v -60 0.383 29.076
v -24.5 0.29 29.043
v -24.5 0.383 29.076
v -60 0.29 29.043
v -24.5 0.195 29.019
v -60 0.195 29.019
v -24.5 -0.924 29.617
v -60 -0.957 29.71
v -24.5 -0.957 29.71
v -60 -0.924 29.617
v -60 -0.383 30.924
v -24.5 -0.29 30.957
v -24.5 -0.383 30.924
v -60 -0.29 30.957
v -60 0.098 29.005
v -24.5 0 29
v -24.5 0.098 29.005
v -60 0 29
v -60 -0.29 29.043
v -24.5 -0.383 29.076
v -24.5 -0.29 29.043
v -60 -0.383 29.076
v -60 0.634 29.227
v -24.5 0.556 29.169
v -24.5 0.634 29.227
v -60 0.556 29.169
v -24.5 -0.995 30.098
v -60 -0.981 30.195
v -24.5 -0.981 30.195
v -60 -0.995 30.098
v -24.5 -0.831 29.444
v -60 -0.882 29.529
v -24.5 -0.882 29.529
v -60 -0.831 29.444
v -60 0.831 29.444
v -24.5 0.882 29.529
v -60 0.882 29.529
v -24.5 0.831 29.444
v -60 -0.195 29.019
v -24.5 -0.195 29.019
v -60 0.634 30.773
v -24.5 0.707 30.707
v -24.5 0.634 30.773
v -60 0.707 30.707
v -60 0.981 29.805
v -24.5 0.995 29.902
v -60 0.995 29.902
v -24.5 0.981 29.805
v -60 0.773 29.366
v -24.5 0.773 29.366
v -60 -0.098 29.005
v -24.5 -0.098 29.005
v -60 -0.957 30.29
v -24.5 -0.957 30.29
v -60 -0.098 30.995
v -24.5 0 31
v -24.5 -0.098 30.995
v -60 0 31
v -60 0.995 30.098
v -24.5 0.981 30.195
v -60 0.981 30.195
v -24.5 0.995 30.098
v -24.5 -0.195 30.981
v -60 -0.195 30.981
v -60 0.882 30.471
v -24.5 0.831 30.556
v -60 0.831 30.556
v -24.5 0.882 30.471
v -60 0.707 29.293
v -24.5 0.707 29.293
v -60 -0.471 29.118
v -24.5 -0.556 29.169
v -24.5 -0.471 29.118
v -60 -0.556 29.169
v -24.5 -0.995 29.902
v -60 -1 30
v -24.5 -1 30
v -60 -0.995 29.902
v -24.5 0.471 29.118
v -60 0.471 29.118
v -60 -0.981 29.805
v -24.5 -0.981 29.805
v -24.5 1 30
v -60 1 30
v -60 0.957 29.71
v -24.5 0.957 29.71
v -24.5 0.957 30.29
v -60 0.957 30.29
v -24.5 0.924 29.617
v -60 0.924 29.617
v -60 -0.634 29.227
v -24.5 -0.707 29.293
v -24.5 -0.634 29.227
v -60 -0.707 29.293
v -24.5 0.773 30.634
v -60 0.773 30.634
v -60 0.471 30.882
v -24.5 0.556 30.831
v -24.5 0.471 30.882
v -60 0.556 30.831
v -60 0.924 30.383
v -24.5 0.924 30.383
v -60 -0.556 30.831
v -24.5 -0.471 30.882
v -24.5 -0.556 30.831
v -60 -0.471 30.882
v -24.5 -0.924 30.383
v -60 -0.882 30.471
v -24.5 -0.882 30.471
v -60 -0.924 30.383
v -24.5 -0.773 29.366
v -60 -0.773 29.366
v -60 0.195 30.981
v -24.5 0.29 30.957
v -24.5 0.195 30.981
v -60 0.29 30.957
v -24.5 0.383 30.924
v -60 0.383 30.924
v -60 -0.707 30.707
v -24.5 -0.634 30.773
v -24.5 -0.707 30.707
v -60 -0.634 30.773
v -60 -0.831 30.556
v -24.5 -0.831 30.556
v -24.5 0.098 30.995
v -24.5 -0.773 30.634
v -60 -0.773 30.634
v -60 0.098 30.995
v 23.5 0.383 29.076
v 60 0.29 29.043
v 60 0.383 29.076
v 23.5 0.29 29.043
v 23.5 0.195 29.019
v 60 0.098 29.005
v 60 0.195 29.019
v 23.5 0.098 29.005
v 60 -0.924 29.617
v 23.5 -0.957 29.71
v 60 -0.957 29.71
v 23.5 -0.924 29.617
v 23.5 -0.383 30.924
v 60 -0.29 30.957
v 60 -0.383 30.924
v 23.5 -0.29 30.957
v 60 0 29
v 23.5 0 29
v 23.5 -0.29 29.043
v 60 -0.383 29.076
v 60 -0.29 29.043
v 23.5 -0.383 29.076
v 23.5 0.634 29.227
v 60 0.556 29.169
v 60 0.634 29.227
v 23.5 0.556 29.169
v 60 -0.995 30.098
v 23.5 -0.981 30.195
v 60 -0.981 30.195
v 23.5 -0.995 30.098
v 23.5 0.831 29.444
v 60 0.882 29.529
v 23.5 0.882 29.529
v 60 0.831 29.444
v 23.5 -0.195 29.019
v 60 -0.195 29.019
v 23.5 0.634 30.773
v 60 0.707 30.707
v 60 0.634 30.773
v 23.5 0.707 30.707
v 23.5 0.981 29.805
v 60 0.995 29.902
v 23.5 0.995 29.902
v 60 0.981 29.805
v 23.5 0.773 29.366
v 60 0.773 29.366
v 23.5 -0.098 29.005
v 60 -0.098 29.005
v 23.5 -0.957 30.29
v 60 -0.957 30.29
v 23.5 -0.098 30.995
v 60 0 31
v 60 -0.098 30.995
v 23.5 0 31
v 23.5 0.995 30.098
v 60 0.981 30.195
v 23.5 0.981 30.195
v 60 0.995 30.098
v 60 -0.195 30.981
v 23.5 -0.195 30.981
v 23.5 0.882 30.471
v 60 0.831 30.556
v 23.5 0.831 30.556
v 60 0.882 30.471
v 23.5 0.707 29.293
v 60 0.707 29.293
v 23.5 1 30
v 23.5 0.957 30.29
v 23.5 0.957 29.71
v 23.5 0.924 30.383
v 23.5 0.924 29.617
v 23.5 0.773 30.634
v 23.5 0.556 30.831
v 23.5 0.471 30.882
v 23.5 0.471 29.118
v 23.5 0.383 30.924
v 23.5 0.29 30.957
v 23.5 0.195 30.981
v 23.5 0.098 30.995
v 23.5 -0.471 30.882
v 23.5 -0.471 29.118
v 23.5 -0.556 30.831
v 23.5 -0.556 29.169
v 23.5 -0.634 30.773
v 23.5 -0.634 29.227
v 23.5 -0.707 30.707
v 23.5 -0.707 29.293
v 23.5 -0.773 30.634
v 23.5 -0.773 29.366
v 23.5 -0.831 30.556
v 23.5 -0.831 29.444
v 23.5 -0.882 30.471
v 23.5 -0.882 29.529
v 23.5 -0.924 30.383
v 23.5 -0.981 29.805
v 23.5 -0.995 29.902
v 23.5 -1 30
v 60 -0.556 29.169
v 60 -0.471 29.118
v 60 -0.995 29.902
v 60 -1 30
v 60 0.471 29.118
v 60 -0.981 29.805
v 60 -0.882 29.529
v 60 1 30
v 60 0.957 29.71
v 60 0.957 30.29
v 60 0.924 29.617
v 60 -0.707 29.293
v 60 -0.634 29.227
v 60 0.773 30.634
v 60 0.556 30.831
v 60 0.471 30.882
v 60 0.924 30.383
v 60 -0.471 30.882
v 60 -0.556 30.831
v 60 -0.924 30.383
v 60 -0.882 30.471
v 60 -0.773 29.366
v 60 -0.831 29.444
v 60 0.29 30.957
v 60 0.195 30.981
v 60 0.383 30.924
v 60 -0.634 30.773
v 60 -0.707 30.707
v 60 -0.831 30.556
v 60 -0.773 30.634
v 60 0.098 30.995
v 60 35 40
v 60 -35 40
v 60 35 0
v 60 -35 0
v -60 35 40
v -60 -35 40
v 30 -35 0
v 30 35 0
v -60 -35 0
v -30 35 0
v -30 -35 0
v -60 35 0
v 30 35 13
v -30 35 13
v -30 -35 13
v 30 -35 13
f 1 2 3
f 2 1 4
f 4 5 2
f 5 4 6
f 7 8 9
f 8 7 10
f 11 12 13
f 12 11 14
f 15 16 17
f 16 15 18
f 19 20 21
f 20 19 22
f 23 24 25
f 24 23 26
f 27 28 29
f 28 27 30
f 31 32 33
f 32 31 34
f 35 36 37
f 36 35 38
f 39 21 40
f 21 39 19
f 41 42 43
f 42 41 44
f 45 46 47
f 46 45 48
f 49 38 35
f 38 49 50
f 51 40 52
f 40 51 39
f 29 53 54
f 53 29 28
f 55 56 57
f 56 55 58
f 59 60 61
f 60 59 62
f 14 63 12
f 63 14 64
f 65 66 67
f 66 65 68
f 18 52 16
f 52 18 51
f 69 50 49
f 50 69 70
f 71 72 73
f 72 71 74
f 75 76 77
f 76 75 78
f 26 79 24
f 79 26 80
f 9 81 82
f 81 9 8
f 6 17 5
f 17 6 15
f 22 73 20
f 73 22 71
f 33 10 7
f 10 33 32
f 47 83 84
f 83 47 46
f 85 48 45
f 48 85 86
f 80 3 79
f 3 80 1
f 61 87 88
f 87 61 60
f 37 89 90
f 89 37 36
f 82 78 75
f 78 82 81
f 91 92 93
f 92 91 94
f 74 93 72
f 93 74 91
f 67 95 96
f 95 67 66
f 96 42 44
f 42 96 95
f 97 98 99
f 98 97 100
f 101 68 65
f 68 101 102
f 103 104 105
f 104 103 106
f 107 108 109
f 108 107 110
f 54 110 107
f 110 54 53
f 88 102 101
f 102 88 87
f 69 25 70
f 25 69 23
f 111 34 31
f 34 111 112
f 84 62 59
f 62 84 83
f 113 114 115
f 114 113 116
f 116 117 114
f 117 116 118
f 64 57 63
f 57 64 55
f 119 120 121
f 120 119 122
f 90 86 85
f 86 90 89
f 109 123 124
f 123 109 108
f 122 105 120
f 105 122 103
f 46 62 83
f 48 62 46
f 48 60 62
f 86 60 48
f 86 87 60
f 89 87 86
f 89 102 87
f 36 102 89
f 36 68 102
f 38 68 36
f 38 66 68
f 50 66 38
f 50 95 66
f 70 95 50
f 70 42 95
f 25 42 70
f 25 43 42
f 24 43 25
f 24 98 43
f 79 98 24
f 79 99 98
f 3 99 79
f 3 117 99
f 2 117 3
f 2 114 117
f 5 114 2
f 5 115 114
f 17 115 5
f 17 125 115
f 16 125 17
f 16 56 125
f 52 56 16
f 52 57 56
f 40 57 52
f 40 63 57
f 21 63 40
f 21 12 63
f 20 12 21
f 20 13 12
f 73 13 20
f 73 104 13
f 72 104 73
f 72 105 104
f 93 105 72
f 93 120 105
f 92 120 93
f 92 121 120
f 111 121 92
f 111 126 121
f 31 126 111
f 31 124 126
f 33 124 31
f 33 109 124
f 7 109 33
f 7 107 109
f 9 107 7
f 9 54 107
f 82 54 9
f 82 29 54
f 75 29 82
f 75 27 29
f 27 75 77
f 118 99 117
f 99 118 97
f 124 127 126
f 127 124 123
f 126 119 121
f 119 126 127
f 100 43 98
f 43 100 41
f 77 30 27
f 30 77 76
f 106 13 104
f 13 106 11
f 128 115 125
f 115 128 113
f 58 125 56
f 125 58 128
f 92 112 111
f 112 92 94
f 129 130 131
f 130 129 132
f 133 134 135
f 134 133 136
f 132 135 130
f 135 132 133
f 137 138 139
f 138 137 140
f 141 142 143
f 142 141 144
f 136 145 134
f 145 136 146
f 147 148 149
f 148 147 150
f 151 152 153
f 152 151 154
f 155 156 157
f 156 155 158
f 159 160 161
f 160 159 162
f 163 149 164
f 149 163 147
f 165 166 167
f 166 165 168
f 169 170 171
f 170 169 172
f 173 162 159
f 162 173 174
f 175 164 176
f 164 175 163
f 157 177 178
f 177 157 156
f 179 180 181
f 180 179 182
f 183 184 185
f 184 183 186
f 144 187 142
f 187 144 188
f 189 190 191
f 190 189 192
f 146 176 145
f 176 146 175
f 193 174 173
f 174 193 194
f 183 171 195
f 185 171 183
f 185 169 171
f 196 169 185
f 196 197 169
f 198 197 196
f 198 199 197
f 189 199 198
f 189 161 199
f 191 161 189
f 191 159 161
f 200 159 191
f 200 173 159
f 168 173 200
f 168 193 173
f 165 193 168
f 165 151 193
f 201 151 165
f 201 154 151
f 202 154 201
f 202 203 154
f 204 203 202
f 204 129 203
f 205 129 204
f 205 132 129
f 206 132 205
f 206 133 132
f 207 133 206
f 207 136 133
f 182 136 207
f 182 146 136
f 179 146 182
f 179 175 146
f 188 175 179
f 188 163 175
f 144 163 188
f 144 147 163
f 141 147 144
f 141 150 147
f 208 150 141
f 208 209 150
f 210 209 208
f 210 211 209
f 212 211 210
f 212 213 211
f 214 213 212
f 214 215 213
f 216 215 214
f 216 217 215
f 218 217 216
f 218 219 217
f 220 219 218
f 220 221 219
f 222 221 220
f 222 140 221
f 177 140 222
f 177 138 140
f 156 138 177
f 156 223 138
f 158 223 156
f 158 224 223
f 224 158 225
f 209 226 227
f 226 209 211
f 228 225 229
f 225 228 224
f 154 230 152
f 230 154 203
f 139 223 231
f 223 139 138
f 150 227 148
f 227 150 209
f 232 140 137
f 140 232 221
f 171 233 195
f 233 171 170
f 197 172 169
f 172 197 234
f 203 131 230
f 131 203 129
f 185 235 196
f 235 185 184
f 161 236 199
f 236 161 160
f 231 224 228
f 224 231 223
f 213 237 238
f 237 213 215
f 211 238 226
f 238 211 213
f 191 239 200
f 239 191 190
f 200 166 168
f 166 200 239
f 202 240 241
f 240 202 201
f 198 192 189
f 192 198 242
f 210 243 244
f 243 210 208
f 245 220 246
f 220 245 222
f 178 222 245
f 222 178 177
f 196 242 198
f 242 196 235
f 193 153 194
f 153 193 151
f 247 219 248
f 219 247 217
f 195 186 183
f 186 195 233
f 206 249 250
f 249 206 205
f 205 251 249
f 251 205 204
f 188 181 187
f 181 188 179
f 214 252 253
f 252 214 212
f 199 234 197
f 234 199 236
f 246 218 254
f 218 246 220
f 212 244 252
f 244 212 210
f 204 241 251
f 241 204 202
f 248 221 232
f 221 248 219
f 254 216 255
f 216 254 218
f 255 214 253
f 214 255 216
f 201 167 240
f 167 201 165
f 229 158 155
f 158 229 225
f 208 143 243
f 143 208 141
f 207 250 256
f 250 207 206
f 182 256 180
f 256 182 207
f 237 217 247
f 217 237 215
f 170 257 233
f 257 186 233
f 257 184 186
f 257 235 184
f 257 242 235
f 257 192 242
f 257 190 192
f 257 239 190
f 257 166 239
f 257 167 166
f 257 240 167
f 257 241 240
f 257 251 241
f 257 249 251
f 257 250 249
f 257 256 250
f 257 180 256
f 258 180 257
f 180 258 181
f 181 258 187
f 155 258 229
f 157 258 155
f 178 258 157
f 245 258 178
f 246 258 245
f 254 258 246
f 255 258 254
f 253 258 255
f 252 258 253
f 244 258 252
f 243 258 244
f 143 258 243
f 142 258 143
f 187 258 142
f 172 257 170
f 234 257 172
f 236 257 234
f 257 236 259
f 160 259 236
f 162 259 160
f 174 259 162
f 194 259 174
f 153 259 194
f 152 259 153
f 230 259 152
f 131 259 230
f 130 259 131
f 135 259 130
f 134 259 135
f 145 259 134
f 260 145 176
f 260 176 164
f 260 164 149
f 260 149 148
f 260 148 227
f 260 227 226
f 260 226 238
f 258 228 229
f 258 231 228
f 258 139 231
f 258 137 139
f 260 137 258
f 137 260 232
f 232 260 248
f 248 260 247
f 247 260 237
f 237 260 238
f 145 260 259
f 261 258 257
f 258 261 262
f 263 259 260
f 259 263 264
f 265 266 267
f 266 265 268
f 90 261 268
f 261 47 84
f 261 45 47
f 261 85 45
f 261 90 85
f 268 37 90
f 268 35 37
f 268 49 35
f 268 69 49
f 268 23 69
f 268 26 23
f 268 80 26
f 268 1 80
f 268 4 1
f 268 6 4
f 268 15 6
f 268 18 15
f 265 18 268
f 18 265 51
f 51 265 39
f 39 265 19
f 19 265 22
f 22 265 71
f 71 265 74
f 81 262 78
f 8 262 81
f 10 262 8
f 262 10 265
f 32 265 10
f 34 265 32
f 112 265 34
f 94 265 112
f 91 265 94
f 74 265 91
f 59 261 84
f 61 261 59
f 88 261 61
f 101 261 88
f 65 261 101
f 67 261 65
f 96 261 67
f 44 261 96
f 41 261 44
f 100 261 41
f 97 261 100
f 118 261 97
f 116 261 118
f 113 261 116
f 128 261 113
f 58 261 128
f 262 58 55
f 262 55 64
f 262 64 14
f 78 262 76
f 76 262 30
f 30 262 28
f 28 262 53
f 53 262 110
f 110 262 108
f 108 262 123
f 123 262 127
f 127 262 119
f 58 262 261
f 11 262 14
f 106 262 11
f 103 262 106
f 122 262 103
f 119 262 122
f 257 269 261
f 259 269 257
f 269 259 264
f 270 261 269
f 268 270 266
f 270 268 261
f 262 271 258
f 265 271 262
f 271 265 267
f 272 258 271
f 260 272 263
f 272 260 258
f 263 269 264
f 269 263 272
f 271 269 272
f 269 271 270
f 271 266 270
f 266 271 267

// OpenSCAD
// Mini horizontal gel-electrophoresis buffer tank
// Print orientation: base on XY plane, open top, builds +Z

// ---- Tank ----
tank_x = 120;      // outer length (X)
tank_y = 70;       // outer width (Y)
tank_z = 40;       // outer height (Z)
wall   = 3;        // wall thickness
floor  = 3;        // floor thickness

// ---- Platform ----
plat_len   = 60;   // platform length in X
plat_top_z = 13;   // platform top height (z = floor + 10)

// ---- Holes ----
hole_d = 2;        // electrode hole diameter
hole_y = 0;        // hole Y position
hole_z = 30;       // hole Z position

// ---- Misc ----
eps = 0.5;         // cutter overshoot
$fn = 64;

inner_h = tank_z - floor;  // height above floor (open top)

difference() {
    // Tank body
    translate([-tank_x/2, -tank_y/2, 0])
        cube([tank_x, tank_y, tank_z]);

    // Raised platform (through floor, solid to walls)
    translate([-tank_x/2 + (tank_x - plat_len)/2, -tank_y/2, 0])
        cube([plat_len, tank_y, plat_top_z]);

    // Electrode holes through end walls along X
    for (sx = [-1, 1])
        translate([sx > 0 ? tank_x/2 - 1 : -tank_x/2, hole_y, hole_z])
            rotate([0, 90, 0])
                cylinder(d = hole_d, h = tank_y + 2*eps, center = true);
}
